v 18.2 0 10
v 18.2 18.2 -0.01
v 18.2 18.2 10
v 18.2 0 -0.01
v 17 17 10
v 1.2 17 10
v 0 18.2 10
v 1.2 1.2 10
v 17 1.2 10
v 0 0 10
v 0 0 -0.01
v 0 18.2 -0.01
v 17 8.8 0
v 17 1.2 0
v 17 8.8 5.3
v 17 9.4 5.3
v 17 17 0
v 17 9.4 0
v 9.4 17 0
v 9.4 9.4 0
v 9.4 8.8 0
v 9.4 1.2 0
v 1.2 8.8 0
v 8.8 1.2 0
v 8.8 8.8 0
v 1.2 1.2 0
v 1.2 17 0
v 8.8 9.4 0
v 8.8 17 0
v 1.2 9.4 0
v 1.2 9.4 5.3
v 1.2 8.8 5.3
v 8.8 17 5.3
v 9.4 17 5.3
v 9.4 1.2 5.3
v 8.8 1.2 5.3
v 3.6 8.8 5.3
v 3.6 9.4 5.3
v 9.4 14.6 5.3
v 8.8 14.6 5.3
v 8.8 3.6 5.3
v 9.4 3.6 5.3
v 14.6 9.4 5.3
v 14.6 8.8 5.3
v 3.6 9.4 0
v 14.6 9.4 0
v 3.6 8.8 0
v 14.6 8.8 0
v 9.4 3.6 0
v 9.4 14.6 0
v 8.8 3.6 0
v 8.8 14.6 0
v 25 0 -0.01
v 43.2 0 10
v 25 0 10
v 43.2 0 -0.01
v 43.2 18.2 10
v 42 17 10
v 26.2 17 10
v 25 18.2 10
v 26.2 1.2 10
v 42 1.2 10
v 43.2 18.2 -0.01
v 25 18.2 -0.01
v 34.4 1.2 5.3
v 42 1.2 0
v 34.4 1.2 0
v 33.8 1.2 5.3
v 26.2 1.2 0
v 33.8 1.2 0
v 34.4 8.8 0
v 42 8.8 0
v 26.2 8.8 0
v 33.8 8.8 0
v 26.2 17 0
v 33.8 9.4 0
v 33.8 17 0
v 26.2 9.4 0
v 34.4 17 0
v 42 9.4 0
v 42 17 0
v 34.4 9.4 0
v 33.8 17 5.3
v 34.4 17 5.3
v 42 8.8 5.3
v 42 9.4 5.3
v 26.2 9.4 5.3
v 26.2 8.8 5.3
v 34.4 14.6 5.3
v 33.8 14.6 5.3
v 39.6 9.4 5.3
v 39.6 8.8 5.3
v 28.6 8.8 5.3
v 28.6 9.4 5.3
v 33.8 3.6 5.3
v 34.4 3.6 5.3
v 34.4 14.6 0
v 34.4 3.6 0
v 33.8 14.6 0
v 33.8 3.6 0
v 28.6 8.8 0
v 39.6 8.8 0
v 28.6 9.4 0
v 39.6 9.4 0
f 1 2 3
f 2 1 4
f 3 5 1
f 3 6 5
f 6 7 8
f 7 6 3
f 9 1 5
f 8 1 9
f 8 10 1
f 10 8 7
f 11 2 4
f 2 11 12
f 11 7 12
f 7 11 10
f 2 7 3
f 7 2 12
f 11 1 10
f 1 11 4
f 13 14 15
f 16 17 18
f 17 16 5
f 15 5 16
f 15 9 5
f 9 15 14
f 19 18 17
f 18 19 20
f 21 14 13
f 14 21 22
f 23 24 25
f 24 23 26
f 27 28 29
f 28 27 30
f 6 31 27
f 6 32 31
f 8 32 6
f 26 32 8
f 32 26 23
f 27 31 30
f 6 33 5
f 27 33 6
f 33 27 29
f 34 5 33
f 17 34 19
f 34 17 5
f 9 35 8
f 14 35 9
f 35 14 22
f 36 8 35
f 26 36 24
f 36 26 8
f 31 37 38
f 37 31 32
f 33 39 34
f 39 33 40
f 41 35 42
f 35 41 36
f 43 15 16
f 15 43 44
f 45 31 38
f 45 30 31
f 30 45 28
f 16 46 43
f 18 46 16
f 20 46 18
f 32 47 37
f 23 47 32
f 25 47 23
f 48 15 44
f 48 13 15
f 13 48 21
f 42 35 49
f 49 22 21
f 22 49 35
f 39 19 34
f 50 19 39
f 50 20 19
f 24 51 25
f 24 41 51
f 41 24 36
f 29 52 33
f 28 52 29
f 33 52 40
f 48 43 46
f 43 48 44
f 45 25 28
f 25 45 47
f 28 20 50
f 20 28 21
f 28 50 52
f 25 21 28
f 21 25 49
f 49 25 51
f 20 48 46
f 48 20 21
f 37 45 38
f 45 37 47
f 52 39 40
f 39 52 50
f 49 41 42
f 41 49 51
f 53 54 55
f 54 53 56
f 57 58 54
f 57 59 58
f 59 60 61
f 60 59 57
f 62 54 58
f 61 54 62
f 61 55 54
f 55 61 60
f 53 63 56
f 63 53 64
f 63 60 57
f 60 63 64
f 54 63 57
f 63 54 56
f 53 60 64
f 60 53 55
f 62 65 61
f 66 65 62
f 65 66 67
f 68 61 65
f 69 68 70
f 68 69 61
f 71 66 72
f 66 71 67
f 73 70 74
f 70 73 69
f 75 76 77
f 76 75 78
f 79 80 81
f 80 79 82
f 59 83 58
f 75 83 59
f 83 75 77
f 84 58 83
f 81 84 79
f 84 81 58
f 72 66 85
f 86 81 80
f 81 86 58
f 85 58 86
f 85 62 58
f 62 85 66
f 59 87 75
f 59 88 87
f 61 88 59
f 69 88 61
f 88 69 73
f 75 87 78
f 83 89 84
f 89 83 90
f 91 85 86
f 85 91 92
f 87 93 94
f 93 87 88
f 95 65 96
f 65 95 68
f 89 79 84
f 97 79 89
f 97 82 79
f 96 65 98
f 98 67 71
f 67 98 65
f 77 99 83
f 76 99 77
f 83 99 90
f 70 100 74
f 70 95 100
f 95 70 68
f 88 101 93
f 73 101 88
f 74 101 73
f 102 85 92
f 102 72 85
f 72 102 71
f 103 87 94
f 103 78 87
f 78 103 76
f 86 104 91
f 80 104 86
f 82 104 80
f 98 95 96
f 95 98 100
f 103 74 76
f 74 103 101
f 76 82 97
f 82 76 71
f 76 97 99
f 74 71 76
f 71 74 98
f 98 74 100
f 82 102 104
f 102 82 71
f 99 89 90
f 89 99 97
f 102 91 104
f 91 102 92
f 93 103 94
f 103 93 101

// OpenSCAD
// file: ../../Base/Boxes.scad
// Fischertechnik Box Foundation
// Pre-designed Boxes

use <Constants.scad>

include <PlacementOptions.scad>

box190Width = 190;
box190Depth = 130;
box130Width = 130;
box130Depth = 95;
boxUsageHeight = 33.9;
boxWallThickness = 2.4;
boxBaseThickness = 1.0;

// getBoxWallThickness()
// Gets the wall thickness of a Fischertechnik Box

function getBoxWallThickness() = boxWallThickness;

// Gets the usable height of a fischertechnik box
function getBoxUsageHeight() = boxUsageHeight;

// Gets the thickness of the Fischertechnik box base.
function getBoxBaseThickness() = boxBaseThickness;

// Gets the usable inner space of a Box 190 as an x/y-list
function getBox190Space() = [
    box190Width - 2*getBoxWallThickness(), 
    box190Depth - 2*getBoxWallThickness() ];

// Imports the Fischertechnik empty box 130x190 mm and places it at position 0,0
// 190x130 are the outer sizes, the inner space is slightly smaller. Use getBox190Space() to get the inner sizes.
// This module needs the STL file "Fischertechnik Box 130x190.stl" in the library path.
// The box is positioned that the usable inner space is at the 0,0,0 position. The

module Box190() {
    translate([-getBoxWallThickness(),-getBoxWallThickness(),-getBoxBaseThickness()])
        import("Fischertechnik Box 130x190.stl", convexity=3);
}

// Gets the usable inner space of a Box 130 as an x/y-list
function getBox130Space() = [
    box130Width - 2*getBoxWallThickness(), 
    box130Depth - 2*getBoxWallThickness() ];

// Imports the Fischertechnik empty box 95x130 mm and places it at position 0,0
// 190x130 are the outer sizes, the inner space is slightly smaller. Use getBox190Space() to get the inner sizes.
// This module needs the STL file "Fischertechnik Box 95x130.stl" in the library path.
// The box is positioned that the usable inner space is at the 0,0,0 position. The

module Box130() {
    translate([-getBoxWallThickness(),-getBoxWallThickness(),-getBoxBaseThickness()])
        import("Fischertechnik Box 95x130.stl", convexity=3);
}

// Creates a web at the specified box walls
// corner 0 = LowerLeft, 1 = UpperLeft, 2 = UpperRight, 3 = LowerRight
// side 0 = LeftOfCorner, 1 = RightOfCorner
// distance = Distance in mm from the corner
// box = inner width and depth of the box (default: Box 190)
// webWidth = length of the web (default is 3 mms)
// webThickness = thickness of the web (default is 1 mm)

module BoxWeb(corner, side, distance, box=getBox190Space(), webWidth=3, webThickness=1.0) {
    sink = getBoxWallThickness()/2;

    width = (corner % 2 == 0) ? 
            (side == LeftOfCorner ? webWidth : webThickness) :
            (side == LeftOfCorner ? webThickness : webWidth);

    depth = (corner % 2 == 0) ? 
            (side == RightOfCorner ? webWidth : webThickness) :
            (side == RightOfCorner ? webThickness : webWidth);
    
    xDiff = corner == LowerLeft ? 
                (side == LeftOfCorner ? -sink : distance) :
            (corner == UpperLeft ?                
                (side == LeftOfCorner ? distance : -sink) :
            (corner == UpperRight ?
                (side == LeftOfCorner ? box.x-webWidth+sink : box.x-distance-webThickness) :
                (side == LeftOfCorner ? box.x-distance-webThickness: box.x-webWidth+sink)));

    yDiff = corner == LowerLeft ? 
                (side == RightOfCorner ? -sink : distance) :
            (corner == UpperLeft ?
                (side == RightOfCorner ? box.y-distance : box.y-webWidth+sink) :
            (corner == UpperRight ?
                (side == RightOfCorner ? box.y-webWidth+sink : box.y-distance) :
                (side == RightOfCorner ? distance : -sink)));
    
    translate([xDiff, yDiff, -getExcess()])
        cube([width, depth, boxUsageHeight + 2*getExcess()]);
}
// file: ../../Base/Rotation.scad
// Fischertechnik Box Foundation
// Geometry Helpers Rotation

include <PlacementOptions.scad>

// getRotatedSpace(space, rotation=NoRotation)
// Rotates the space dependent on the specified rotation

function getRotatedSpace(space, rotation=NoRotation) = [
    (rotation == Rotate90 || rotation == Rotate270) ? space.y : space.x,
    (rotation == Rotate90 || rotation == Rotate270) ? space.x : space.y
];

// Rotates the given space around the fixed left lower corner
// space = the space the children needs as width/depth list [width,depth]
// rotation = 0 Rotate0 degrees, 1 Rotate90 degrees, 2 Rotate180 degrees, 3 Rotate270 degrees (equivalent to -90)

module RotateFix(space, rotation=Rotate0) {
    dy = (rotation == Rotate0 || rotation == Rotate270) ? 0 :
        (rotation == Rotate90) ? space.x :
        space.y;
    dx = (rotation < Rotate180) ? 0 :
        (rotation == Rotate180) ? space.x :
        space.y;
    
    translate([dx, dy, 0])
        rotate([0, 0, rotations[rotation]])
            children();
}
// file: ../../Base/Alignment.scad
// Fischertechnik Box Foundation
// Geometry Helpers Alignment

include <PlacementOptions.scad>

// getAlignedX(elementWidth, spaceWidth, align=AlignRight, offset=0)
// Gets the aligned X offset of an element with the given
// width in the given space.
// elementWidth = The width of the element to positon
// spaceWidth = The space where the element should be aligned
// align = 0 AlignLeft, 1 AlignCenter, 2 AlignRight
// offset = an optional offset from the aligned position. When
// aligned left or centered, then positive values are in X direction.
// When aligned right then positive values are in negative X direction.

function getAlignedX(elementWidth, spaceWidth, align=AlignRight, offset=0) =
    (align == AlignLeft) ?
        offset :
        ((align == AlignCenter) ?
        (spaceWidth - elementWidth)/2 + offset :
        spaceWidth - offset - elementWidth);

// getAlignedY(elementDepth, spaceDepth, align=AlignTop, offset=0)
// Gets the aligned Y offset of an element with the given
// depth in the given space.
// elementDepth = The depth of the element to positon
// spaceDepth = The space where the element should be aligned
// align = 0 AlignBottom, 1 AlignCenter, 2 AlignTop
// offset = an optional offset from the aligned position. When
// aligned bottom or centered, then positive values are in Y direction.
// When aligned top then positive values are in negative Y direction.

function getAlignedY(elementDepth, spaceDepth, align=AlignTop, offset=0) =
    (align == AlignBottom) ?
        offset :
        ((align == AlignCenter) ?
        (spaceDepth - elementDepth)/2 + offset :
        spaceDepth - offset - elementDepth);
// file: ../../Base/Constants.scad
// Fischertechnik Box Foundation
// Constants

// Constant values necessary for multiple elements

// Base constants
dividerThickness = 1.2;
excess = 0.01;
fragments = 90;
tolerance = 0.8;

// Gets the thickness of a divider 
function getDividerThickness() = dividerThickness;

// Gets the excess that is used to merge walls into each other
function getExcess() = excess;

// Gets amount of fragments of a cylinder
function getFragments() = fragments;

// Gets the inner tolerance of a frame to each side
function getTolerance() = tolerance;


// Fischertechnik specific constants
axisDiameter = 4;
axisBottomDiameter = axisDiameter + 1;
standardEdgeDistance = 2.5;
standardWebDistance = 11.5;
standardCornerLength = 15;
tubeWallFactor = 1.6;

// Gets axis diameter
function getAxisDiameter() = axisDiameter;

// Gets axis bottom diameter for thicker part at the bottom
function getAxisBottomDiameter() = axisBottomDiameter;

// gets the standard distance to the wall of the box for dockable frames with webs
function getStandardEdgeDistance() = standardEdgeDistance;

// gets the standard distance of each web to the corner of the dockable frame
function getStandardWebDistance() = standardWebDistance;

// gets the standard length of the corner walls of a dockable frame
function getStandardCornerLength() = standardCornerLength;

// gets the wall thickness of a tube.
function getTubeWallThickness() = tubeWallFactor * getDividerThickness();
// file: ../../Base/PlacementOptions.scad
// Fischertechnik Box Foundation
// Placement Options

// Alignment
NoAlign = 0;
AlignLeft = 1;
AlignBottom = 2;
AlignCenter = 3;
AlignRight = 4;
AlignTop = 5;

// Element rotation degree steps
rotations = [0, -90, -180, -270];

// Rotation
NoRotation = 0;
Rotate0 = 0;
Rotate90 = 1;
Rotate180 = 2;
Rotate270 = 3;

// Docking (seen from above)
NoDock = -1;
DockLeft = 0;
DockTop = 1;
DockRight = 2;
DockCorner = 2;
DockBottom = 3;

// Web corners
LowerLeft = 0;
UpperLeft = 1;
UpperRight = 2;
LowerRight = 3;

// Web position relative to corner
LeftOfCorner = 0;
RightOfCorner = 1;
// file: ../../Elements/FrameLightCap.scad
// Fischertechnik Box Library
// Frame for Light Cap
// 31316,31317,31318,31319,31320,31321,31362,36478,36531,36532

use <../Base/Constants.scad>
use <../Base/Placement.scad>
use <../ModelBase/Simple.scad>

width = 15;
depth = 15;
height = 10;

// getFrameLightCapSpace()
// Gets the space the frame for light cap needs as width (.x and .y as a list)

function getFrameLightCapSpace() = getFrameOuterVolume([width, depth, height]);

// FrameBlockWithPin(count)
// Frame for count standing building blocks with pin down

module FrameLightCap() {    
    webThickness = 0.6;
    webDepth = 2;
    webHeight = 5.3;
    
    innerVolume = getFrameInnerVolume([width, depth, height]);

    module InnerFrame() {
        Frame([width, depth, height]);
        
        Center(getFrameLightCapSpace(), [getFrameLightCapSpace().x, webThickness])
            Wall([getFrameLightCapSpace().x, webThickness, webHeight]);
        Center(getFrameLightCapSpace(), [webThickness, getFrameLightCapSpace().y])
            Wall([webThickness, getFrameLightCapSpace().y, webHeight]);
    }

    difference() {
        InnerFrame();
    
        cutoffWidth = width - 2*webDepth;
        cutoffDepth = depth - 2*webDepth;
        
        Center(getFrameLightCapSpace(), [cutoffWidth, cutoffDepth])
            cube([cutoffWidth, cutoffDepth, height]);
    }
}

// Test
color("lightgray") {
    FrameLightCap();
}
// file: ../../Base/Placement.scad
// Fischertechnik Box Foundation
// Geometry Helpers Placement

use <Constants.scad>
use <Alignment.scad>
use <Rotation.scad>
use <Boxes.scad>

include <PlacementOptions.scad>

// Place(x=0, y=0, elementSpace=[0,0], alignX=AlignLeft, alignY=AlignBottom, rotation=Rotate0, boxSpace=getBox190Space())
// Places the child at the specified position
// y = Y-Position. This is a relative position when an X aligment is specified.
// x = X-Position. This is a relative position when an Y aligment is specified.
// elementSpace = space of the element to be placed [x,y]
// alignX = -1=NoAlign, 0 AlignLeft, 1 AlignCenter, 3 AlignRight (elementSpace and boxSpace required!)
// alignY = -1=NoAlign, 2 AlignBottom, 1 AlignCenter, 4 AlignTop (elementSpace and boxSpace required!)
// rotation = 0 Rotate0 0 degrees, 1 Rotate90 90 degrees, 
// 2 Rotate180 180 degrees, 3 Rotate270 270 degrees (equivalent to -90)
// boxSpace = Inner space of the box where the placement occurs [x,y] - default is Box 190x130 inner space

module Place(x=0, y=0, elementSpace=[0,0], 
  alignX=AlignLeft, alignY=AlignBottom, 
  rotation=NoRotation, boxSpace=getBox190Space()) {

    module Position(x, y, space, rotation=Rotate0) {
        translate([x, y, 0])
            RotateFix(space, rotation)
                children(0);
    }

    space = getRotatedSpace(elementSpace, rotation);
    alignedX = getAlignedX(space.x, boxSpace.x, alignX, x);
    alignedY = getAlignedY(space.y, boxSpace.y, alignY, y);
    Position(alignedX, alignedY, elementSpace, rotation)
        children(0);
}

// Center(space=getBox130Space(), elementSpace=[0,0])
// space = Space where the children is centered. For cylinder use centered=true and no elementSpace.
// elementSpace = space of the element to be centered [x,y]

module Center(space=getBox190Space(), elementSpace=[0,0]) {
    translate([(space.x - elementSpace.x) / 2, (space.y - elementSpace.y) / 2])
        children(0);
}

// CenterHorizontal(width=0, y=0, offset=0, space=getBox130Space())
// space = Space where the children is centered. For cylinder use centered=true and no elementSpace.
// elementSpace = space of the element to be centered [x,y]

module CenterHorizontal(width=0, y=0, offset=0, space=getBox190Space()) {
    translate([(space.x - width) / 2 + offset, y])
        children(0);
}

// CenterVertical(depth=0, x=0, offset=0, space=getBox130Space())
// space = Space where the children is centered. For cylinder use centered=true and no elementSpace.
// elementSpace = space of the element to be centered [x,y]

module CenterVerticalal(depth=0, x=0, offset=0, space=getBox190Space()) {
    translate([x, (space.y - depth) / 2 + offset])
        children(0);
}
// main file
// Fischertechnik Box Foundation
// Elements
// Test FrameLightCap

use <../../Base/Placement.scad>
use <../../Elements/FrameLightCap.scad>

include <../../Base/PlacementOptions.scad>

FrameLightCap();

Place(25, 0, getFrameLightCapSpace(), rotation=Rotate90)
    FrameLightCap();
